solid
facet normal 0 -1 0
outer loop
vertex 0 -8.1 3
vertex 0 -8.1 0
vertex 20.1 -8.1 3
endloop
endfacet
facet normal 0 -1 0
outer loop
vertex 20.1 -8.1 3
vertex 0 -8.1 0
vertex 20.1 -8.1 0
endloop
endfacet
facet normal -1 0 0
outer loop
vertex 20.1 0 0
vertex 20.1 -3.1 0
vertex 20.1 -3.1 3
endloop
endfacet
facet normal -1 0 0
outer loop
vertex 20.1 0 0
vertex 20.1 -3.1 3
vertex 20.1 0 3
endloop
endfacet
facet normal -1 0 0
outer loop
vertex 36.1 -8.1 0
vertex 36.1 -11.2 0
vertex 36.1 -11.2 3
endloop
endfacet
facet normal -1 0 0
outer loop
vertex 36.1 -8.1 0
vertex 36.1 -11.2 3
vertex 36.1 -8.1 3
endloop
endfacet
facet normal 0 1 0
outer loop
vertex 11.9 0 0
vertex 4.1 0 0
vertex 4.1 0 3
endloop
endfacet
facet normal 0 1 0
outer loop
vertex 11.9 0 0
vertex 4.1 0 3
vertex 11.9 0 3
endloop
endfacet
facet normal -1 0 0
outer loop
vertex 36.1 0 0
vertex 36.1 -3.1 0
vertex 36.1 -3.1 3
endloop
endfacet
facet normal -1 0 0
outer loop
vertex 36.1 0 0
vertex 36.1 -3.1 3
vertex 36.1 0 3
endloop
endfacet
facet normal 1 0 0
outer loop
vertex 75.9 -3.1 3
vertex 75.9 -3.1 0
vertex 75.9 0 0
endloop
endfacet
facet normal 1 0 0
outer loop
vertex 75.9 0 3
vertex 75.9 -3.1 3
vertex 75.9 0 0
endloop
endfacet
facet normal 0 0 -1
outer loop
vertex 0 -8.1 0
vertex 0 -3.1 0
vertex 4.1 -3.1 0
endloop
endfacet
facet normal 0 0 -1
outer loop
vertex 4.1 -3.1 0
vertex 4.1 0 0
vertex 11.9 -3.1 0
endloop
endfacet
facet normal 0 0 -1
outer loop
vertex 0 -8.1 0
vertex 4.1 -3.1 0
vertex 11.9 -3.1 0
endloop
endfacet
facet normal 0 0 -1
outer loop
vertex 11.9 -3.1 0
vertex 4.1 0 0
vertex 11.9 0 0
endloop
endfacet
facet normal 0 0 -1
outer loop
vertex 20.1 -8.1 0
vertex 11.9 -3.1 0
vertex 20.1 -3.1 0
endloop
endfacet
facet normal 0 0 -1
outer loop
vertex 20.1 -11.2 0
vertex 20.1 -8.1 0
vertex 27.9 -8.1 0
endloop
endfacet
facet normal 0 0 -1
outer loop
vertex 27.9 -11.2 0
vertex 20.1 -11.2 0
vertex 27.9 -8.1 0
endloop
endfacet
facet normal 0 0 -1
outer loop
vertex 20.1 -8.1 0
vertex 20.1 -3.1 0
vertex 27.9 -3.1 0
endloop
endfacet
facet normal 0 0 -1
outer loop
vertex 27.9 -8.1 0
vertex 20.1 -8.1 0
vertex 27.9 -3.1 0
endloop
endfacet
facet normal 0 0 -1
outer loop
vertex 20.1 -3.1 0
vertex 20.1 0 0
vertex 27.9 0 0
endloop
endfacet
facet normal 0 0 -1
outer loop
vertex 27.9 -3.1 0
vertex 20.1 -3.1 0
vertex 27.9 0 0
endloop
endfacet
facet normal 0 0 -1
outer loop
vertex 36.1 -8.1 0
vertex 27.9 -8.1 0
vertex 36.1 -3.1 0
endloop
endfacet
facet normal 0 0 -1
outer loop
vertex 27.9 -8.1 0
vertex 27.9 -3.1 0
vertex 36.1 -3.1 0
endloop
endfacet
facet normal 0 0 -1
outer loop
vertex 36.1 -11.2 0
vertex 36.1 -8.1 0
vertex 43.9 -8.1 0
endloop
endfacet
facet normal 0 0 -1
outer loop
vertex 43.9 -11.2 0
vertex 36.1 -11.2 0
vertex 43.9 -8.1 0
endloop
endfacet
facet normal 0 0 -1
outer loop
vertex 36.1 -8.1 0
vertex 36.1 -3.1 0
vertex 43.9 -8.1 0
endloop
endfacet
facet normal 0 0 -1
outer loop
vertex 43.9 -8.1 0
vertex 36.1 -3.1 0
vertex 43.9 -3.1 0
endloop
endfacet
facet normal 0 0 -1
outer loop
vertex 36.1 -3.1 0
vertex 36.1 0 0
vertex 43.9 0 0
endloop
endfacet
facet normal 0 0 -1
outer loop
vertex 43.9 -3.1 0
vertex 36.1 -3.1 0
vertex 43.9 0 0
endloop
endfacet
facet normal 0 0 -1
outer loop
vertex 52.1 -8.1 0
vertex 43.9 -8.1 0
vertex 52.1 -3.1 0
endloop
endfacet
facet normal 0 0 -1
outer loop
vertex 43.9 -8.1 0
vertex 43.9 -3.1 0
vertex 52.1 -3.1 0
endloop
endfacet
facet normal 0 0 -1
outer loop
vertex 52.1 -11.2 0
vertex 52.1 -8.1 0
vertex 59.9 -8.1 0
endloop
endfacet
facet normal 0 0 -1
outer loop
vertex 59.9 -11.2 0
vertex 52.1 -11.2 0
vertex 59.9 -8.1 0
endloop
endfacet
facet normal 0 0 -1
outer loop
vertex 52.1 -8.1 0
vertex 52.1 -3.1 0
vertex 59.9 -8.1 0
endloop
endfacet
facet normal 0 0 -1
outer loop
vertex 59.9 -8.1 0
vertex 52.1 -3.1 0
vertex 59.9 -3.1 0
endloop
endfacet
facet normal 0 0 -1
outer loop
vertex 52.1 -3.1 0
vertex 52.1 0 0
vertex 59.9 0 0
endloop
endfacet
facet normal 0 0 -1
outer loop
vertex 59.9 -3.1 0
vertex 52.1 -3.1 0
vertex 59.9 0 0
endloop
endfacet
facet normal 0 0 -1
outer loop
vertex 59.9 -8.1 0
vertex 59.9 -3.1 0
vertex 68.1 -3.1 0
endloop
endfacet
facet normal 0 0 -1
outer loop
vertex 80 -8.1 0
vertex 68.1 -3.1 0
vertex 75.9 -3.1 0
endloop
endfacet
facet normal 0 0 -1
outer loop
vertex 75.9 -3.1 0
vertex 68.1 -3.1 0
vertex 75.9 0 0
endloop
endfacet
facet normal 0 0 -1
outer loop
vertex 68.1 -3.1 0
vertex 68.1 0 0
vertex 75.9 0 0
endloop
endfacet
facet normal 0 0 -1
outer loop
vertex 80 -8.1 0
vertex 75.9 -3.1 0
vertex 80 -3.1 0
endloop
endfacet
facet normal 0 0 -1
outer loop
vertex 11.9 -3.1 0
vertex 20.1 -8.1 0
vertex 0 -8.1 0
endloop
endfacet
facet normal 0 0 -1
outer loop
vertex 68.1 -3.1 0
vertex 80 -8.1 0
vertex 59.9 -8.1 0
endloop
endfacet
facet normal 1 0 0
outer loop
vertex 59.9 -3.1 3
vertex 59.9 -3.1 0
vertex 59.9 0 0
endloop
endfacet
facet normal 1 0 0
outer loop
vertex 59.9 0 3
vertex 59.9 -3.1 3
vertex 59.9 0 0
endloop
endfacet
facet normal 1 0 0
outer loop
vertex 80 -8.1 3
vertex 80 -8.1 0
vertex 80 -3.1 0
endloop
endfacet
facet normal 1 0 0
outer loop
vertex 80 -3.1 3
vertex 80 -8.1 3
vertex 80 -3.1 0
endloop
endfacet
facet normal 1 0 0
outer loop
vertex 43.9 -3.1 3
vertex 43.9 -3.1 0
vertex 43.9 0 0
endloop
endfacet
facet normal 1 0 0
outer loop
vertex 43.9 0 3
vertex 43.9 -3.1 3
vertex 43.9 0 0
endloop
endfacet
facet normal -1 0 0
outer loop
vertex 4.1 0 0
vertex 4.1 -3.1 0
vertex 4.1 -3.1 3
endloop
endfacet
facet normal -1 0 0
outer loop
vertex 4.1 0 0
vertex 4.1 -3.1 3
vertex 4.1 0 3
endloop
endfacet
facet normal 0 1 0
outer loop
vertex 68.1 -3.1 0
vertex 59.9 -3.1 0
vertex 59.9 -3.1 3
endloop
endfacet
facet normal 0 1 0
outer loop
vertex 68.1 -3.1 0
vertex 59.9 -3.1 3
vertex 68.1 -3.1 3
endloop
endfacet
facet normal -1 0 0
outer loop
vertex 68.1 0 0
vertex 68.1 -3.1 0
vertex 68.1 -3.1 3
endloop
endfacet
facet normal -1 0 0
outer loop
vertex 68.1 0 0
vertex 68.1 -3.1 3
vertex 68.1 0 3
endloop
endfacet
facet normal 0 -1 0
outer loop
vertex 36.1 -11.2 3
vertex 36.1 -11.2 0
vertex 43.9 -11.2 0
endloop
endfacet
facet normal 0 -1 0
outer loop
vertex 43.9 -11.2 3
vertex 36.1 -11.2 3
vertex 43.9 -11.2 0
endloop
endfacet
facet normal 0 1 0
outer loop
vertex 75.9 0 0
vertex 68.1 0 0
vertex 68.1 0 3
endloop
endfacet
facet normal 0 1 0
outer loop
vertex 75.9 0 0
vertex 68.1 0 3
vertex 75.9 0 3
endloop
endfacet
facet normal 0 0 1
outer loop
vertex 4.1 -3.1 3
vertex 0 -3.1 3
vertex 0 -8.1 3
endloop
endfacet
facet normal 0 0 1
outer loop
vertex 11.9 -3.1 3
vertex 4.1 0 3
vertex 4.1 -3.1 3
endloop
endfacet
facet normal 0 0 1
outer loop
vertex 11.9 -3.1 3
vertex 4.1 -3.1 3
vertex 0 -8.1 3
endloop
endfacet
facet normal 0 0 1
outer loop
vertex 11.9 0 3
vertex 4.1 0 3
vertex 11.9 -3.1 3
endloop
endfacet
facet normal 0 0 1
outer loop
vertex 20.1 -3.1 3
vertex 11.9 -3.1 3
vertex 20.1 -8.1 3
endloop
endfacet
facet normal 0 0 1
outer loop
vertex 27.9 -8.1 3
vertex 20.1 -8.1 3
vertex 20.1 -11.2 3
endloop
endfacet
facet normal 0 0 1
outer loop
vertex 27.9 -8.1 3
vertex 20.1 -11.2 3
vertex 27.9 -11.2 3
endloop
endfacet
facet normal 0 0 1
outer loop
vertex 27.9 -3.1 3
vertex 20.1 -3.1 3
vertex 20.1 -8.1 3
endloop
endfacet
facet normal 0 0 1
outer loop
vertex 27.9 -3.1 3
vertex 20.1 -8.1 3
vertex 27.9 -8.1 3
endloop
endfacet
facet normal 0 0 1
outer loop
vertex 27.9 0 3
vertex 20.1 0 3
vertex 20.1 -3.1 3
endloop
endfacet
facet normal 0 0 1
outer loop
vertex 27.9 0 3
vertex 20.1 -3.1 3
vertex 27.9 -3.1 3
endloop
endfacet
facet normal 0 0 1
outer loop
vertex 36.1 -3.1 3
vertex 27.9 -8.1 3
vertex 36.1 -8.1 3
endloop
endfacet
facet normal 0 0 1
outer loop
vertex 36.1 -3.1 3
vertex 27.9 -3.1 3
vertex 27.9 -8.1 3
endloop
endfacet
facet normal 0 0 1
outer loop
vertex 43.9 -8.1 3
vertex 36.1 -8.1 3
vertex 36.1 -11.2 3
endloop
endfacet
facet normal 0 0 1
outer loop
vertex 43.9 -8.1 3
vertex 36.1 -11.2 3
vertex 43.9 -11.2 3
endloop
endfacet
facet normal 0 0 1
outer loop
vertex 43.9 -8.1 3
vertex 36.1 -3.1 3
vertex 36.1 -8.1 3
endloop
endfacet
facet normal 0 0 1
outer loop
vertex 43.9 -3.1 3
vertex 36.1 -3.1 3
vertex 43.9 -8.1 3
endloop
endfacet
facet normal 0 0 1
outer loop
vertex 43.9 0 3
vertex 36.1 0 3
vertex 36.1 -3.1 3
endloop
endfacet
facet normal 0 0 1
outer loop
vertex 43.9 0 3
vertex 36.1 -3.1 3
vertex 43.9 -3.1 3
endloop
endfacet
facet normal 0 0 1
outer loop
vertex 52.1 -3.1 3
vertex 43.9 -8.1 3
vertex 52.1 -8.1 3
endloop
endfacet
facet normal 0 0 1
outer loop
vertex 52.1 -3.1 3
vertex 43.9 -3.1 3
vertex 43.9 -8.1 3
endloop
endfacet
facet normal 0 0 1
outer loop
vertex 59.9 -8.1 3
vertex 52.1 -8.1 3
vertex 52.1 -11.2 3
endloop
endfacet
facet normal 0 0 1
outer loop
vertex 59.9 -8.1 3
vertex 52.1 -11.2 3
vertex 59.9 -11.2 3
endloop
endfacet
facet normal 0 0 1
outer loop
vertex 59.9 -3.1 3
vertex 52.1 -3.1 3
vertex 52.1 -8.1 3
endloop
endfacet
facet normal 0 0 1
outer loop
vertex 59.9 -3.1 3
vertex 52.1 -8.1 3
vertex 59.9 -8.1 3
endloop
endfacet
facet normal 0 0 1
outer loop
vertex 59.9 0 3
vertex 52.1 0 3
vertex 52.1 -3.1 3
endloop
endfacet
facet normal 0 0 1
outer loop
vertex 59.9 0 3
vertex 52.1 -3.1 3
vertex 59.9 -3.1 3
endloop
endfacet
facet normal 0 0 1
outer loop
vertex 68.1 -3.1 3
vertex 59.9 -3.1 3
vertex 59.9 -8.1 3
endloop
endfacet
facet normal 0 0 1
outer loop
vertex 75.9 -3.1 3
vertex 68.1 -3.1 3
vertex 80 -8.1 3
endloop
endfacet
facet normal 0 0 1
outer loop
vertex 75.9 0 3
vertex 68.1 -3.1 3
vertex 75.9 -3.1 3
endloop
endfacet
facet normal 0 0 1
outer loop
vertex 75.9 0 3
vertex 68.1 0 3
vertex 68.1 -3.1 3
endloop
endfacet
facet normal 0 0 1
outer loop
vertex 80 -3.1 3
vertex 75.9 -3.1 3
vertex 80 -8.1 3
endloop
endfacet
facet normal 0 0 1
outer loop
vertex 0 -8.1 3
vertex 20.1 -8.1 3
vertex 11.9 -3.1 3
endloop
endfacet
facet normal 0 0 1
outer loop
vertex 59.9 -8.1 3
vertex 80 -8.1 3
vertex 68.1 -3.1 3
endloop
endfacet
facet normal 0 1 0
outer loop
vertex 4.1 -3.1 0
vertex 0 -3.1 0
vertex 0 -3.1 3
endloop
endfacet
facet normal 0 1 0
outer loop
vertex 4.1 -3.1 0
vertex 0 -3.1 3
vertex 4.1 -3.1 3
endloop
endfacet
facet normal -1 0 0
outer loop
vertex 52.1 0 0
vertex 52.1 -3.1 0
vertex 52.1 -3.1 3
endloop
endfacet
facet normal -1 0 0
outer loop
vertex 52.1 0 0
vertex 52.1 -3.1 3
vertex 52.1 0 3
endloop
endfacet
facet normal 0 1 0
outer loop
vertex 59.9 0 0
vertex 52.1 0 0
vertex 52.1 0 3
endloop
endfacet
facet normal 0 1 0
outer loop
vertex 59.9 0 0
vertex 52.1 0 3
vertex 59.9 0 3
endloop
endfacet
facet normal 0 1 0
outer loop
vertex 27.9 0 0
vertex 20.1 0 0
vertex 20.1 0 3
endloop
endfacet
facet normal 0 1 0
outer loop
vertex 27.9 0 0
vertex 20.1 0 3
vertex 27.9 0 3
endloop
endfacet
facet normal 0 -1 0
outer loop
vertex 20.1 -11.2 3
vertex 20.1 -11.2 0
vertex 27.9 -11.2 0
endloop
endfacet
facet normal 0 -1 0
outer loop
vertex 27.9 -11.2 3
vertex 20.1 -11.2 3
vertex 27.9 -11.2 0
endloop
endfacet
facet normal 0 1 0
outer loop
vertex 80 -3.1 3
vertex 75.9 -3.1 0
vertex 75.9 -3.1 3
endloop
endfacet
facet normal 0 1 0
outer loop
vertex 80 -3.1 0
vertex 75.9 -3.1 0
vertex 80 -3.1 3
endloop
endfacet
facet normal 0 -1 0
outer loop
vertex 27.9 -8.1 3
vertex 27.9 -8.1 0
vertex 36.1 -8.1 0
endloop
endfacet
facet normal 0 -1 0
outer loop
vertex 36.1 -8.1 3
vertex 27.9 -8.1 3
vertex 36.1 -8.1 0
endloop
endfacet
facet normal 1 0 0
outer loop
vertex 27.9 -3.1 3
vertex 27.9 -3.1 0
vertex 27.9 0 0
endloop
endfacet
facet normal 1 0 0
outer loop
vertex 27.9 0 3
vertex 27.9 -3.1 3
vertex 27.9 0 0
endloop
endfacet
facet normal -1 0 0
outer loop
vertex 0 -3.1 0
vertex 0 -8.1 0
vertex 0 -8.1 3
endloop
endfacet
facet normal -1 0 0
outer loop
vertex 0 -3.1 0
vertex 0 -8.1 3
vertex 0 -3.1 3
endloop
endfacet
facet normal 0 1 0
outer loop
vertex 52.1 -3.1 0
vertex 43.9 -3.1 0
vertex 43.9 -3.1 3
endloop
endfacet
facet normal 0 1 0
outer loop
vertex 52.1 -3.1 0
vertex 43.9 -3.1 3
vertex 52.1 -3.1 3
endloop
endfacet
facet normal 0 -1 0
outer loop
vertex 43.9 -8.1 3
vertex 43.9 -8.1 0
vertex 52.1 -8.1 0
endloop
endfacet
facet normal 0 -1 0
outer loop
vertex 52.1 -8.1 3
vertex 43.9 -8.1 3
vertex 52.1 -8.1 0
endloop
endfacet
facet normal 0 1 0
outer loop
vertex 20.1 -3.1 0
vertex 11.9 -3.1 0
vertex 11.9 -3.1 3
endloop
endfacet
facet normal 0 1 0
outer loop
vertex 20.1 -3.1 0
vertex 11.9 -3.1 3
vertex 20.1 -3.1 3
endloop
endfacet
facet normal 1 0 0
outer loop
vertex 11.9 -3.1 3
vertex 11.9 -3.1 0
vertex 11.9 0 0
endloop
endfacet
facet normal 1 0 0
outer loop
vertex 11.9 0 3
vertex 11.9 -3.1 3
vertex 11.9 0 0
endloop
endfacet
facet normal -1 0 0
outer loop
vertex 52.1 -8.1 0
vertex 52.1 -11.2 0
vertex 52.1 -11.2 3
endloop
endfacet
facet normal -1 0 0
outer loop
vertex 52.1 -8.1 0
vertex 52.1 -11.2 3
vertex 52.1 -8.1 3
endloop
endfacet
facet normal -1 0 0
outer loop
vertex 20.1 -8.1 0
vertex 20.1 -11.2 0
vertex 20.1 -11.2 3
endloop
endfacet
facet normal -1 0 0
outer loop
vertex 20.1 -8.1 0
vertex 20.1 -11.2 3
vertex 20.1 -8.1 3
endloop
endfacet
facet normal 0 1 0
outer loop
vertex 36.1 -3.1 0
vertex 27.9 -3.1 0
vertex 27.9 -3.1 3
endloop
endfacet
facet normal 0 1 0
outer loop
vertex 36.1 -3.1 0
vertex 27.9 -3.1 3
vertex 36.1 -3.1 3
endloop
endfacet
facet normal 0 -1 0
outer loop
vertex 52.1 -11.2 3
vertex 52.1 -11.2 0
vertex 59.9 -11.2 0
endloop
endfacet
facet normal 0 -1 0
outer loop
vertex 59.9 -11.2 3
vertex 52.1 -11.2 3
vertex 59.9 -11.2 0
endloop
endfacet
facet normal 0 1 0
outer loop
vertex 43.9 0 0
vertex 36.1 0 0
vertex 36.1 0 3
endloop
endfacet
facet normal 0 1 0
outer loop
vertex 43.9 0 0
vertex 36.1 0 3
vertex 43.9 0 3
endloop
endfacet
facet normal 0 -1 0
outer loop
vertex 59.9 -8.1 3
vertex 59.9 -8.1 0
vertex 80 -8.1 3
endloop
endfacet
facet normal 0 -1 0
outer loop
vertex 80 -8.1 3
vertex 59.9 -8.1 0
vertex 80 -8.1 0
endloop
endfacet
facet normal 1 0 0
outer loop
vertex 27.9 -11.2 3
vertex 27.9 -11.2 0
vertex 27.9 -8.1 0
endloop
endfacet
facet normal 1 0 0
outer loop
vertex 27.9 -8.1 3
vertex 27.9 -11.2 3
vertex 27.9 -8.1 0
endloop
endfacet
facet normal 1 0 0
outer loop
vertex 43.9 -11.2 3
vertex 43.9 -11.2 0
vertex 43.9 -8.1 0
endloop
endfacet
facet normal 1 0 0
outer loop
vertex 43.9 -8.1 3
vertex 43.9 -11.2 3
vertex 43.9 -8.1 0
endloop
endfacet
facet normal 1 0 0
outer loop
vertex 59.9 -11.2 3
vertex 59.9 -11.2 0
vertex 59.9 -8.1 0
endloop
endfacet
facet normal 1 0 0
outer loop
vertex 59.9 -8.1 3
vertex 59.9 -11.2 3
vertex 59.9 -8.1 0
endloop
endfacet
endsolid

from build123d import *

# Parameters (mm, degrees)
SKETCH1_W           = 80
SKETCH1_H           = 11.2
BOSS_EXTRUDE1_DEPTH = 3
SKETCH3_W           = 20.2
SKETCH3_H           = 3.2
SKETCH3_W_2         = 4.2
SKETCH3_W_3         = 8.2
CUT_EXTRUDE1_DEPTH  = 4


with BuildPart() as part:
    # Sketch1 → Boss-Extrude1 (new body)
    with BuildSketch(Plane.XY):
        with Locations((40, -5.6)):
            Rectangle(SKETCH1_W, SKETCH1_H)
    extrude(amount=BOSS_EXTRUDE1_DEPTH)

    # Sketch3 → Cut-Extrude1 (cut, through all)
    with BuildSketch(Plane.XY):
        with Locations((10, -9.7)):
            Rectangle(SKETCH3_W, SKETCH3_H)
        with Locations((2, -1.5)):
            Rectangle(SKETCH3_W_2, SKETCH3_H)
        with Locations((32, -1.5)):
            Rectangle(SKETCH3_W_3, SKETCH3_H)
        with Locations((16, -1.5)):
            Rectangle(SKETCH3_W_3, SKETCH3_H)
        with Locations((48, -9.7)):
            Rectangle(SKETCH3_W_3, SKETCH3_H)
        with Locations((32, -9.7)):
            Rectangle(SKETCH3_W_3, SKETCH3_H)
        with Locations((70, -9.7)):
            Rectangle(SKETCH3_W, SKETCH3_H)
        with Locations((64, -1.5)):
            Rectangle(SKETCH3_W_3, SKETCH3_H)
        with Locations((48, -1.5)):
            Rectangle(SKETCH3_W_3, SKETCH3_H)
        with Locations((78, -1.5)):
            Rectangle(SKETCH3_W_2, SKETCH3_H)
    extrude(amount=CUT_EXTRUDE1_DEPTH, mode=Mode.SUBTRACT)


solid = part.part
